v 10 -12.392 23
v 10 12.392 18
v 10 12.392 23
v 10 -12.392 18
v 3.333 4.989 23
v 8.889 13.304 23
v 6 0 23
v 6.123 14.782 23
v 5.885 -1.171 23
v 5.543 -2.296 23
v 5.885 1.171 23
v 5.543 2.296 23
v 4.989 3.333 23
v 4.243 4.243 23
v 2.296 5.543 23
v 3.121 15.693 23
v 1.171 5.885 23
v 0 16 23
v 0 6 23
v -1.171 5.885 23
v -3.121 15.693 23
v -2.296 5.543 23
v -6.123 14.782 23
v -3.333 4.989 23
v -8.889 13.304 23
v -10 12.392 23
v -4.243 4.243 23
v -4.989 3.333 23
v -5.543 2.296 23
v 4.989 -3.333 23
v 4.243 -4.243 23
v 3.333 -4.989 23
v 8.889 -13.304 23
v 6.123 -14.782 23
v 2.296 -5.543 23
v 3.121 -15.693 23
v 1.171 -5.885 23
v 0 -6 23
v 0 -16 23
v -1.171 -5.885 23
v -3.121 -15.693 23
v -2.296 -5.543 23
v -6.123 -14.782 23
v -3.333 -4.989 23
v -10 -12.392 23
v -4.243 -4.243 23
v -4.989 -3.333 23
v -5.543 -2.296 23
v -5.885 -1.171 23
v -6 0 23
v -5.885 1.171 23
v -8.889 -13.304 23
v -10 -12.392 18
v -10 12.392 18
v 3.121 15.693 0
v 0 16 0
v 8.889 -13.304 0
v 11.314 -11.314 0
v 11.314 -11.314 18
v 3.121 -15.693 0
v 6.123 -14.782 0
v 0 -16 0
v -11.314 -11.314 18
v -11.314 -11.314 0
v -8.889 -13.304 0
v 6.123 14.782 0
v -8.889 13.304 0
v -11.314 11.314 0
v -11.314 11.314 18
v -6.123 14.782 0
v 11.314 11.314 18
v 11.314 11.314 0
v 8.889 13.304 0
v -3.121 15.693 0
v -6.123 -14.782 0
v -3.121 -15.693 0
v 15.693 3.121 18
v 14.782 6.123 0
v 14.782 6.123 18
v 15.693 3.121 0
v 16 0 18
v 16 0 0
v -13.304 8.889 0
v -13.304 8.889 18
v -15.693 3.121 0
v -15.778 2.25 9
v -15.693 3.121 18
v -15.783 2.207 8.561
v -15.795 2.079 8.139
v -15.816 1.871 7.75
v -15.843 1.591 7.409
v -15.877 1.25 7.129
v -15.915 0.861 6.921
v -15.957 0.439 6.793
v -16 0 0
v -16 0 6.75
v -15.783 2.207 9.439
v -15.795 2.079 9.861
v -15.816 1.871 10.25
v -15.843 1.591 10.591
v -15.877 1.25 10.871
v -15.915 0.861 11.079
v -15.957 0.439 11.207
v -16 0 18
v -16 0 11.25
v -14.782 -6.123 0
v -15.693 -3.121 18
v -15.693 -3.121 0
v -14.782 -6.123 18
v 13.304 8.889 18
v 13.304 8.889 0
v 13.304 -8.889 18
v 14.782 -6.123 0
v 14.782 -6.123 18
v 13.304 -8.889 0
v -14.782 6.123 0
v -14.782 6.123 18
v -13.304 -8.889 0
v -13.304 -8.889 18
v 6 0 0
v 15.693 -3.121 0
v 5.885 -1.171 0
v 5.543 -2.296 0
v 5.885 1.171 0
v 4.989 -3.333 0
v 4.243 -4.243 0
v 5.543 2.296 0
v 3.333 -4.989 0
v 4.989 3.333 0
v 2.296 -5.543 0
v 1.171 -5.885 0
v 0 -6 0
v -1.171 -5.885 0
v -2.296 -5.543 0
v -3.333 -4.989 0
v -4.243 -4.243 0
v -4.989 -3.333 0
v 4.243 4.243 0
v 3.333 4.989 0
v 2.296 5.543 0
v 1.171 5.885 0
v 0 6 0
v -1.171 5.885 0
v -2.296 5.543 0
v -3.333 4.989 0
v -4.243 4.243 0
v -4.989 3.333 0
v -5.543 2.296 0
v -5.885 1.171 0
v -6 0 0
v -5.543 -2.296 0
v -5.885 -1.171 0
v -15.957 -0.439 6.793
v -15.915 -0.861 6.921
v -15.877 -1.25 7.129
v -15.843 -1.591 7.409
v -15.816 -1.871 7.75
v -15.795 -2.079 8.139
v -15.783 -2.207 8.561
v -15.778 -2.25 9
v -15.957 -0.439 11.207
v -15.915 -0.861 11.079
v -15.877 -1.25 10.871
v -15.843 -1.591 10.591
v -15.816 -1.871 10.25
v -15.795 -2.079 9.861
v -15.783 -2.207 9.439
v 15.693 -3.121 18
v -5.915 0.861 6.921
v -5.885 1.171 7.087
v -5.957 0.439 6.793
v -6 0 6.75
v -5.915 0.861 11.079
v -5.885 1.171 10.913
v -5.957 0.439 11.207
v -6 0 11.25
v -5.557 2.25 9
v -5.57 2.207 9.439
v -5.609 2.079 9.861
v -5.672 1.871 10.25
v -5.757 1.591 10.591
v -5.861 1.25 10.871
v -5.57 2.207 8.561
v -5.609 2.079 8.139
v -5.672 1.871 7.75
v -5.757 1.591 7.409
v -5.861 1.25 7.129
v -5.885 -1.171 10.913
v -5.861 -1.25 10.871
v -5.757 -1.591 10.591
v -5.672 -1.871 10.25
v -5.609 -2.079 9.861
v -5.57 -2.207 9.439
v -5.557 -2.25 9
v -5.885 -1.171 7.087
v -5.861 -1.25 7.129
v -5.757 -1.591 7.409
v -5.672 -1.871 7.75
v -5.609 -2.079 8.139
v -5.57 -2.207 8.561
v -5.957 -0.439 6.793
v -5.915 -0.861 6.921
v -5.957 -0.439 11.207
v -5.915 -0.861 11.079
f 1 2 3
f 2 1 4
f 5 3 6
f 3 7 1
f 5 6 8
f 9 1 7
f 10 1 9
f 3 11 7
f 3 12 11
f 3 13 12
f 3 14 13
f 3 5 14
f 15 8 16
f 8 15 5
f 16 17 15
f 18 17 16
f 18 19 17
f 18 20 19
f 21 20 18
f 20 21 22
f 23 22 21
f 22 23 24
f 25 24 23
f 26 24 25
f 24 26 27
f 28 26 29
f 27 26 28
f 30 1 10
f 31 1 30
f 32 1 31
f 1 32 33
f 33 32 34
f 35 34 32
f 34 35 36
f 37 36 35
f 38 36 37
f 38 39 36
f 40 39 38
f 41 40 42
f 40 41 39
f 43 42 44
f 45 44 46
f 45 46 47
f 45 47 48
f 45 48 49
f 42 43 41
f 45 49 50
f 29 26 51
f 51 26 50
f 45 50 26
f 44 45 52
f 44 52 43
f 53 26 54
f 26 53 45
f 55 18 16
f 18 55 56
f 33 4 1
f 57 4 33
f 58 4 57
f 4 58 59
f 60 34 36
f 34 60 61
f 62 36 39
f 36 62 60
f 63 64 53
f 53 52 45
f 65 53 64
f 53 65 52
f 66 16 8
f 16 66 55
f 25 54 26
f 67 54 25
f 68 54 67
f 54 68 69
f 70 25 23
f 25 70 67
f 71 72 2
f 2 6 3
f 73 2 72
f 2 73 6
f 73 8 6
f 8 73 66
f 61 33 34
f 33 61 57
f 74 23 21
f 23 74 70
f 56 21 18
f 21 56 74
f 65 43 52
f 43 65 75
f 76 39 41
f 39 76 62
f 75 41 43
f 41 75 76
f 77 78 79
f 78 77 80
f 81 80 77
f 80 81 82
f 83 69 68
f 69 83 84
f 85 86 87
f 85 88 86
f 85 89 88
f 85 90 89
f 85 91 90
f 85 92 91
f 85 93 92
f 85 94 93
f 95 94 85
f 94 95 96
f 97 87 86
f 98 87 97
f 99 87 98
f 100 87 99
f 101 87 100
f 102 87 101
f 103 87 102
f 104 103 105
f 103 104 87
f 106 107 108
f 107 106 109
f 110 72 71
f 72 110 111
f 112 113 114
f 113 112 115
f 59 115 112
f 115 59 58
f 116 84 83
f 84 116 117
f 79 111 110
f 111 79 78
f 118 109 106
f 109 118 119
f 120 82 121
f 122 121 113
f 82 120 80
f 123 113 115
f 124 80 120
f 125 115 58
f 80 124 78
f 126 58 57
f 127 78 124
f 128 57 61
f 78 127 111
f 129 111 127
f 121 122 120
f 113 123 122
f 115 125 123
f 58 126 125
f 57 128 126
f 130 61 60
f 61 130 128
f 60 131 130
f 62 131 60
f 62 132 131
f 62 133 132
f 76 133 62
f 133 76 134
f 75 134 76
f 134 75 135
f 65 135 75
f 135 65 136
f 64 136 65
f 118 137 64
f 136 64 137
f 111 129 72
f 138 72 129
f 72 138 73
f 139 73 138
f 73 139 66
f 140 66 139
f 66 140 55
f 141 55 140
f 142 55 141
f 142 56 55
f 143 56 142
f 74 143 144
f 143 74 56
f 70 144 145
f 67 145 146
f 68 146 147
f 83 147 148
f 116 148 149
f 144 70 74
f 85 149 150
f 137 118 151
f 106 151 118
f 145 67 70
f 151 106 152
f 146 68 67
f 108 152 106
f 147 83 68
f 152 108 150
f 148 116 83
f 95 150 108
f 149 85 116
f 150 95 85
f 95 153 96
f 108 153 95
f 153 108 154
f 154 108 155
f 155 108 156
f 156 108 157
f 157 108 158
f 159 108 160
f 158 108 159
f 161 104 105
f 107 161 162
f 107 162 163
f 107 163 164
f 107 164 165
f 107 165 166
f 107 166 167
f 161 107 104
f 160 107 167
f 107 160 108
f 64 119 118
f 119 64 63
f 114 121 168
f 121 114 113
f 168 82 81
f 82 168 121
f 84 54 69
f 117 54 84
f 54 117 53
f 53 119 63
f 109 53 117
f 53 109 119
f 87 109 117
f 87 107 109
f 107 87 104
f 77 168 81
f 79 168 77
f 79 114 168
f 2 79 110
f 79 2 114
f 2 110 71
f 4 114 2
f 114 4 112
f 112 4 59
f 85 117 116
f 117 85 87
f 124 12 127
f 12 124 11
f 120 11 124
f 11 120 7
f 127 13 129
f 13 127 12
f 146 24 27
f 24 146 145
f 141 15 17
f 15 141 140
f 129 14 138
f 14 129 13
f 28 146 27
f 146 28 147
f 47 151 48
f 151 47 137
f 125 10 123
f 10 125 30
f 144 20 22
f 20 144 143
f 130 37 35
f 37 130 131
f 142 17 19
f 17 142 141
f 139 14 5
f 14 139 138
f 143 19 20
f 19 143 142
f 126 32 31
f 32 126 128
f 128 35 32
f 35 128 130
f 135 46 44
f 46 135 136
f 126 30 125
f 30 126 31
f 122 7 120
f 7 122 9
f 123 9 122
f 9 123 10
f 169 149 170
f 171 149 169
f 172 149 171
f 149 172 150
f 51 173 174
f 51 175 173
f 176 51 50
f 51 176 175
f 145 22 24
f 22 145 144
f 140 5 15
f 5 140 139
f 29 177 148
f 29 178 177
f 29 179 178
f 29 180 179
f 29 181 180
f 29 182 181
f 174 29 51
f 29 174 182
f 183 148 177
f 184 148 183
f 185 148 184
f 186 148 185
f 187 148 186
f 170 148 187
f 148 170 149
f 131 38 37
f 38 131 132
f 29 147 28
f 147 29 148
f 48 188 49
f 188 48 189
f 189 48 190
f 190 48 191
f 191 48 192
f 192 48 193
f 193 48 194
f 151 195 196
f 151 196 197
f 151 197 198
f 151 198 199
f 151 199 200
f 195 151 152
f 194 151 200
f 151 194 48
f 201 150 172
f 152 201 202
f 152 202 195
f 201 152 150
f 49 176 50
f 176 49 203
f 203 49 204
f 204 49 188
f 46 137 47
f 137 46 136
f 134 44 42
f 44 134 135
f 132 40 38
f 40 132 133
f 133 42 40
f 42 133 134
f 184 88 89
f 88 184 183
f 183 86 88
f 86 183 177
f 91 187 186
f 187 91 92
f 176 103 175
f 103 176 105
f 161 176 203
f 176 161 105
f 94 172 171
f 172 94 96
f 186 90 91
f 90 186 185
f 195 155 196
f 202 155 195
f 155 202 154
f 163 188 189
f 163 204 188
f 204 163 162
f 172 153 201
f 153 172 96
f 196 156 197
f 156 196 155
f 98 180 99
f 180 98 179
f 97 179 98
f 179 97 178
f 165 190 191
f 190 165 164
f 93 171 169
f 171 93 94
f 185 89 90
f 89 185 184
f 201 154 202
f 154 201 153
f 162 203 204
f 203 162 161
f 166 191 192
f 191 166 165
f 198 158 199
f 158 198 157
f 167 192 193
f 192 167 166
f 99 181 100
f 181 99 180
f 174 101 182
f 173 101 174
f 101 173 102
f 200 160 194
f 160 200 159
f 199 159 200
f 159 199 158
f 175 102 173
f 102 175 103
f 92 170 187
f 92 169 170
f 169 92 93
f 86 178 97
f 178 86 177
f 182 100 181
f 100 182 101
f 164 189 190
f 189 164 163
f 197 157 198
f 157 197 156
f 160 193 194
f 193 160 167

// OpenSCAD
$fn = 32;

// ----------------------------------------------------------------------
// Oldham coupling hub: 32 x 23 mm
// ----------------------------------------------------------------------

// --- parameters (mm) ---
hub_d = 32;               // hub diameter
hub_l = 18;               // hub length
bore_d = 12;              // shaft bore
tongue_w = 20;            // drive tongue width
tongue_h = 5;             // drive tongue height
set_d = 4.5;              // set screw tap hole

module hub() {
  cylinder(h = hub_l, d = hub_d);
  /* tongue, clipped to the hub disc and sunk 1 mm into the face */
  intersection() {
    translate([-tongue_w / 2, -hub_d / 2, hub_l - 1])
      cube([tongue_w, hub_d, tongue_h + 1]);
    translate([0, 0, hub_l - 1]) cylinder(h = tongue_h + 1, d = hub_d);
  }
}

difference() {
  hub();
  translate([0, 0, -1]) cylinder(h = hub_l + tongue_h + 2, d = bore_d);
  translate([-hub_d / 2 - 1, 0, hub_l * 0.5])
    rotate([0, 90, 0]) cylinder(h = hub_d / 2 + 2, d = set_d);
}
